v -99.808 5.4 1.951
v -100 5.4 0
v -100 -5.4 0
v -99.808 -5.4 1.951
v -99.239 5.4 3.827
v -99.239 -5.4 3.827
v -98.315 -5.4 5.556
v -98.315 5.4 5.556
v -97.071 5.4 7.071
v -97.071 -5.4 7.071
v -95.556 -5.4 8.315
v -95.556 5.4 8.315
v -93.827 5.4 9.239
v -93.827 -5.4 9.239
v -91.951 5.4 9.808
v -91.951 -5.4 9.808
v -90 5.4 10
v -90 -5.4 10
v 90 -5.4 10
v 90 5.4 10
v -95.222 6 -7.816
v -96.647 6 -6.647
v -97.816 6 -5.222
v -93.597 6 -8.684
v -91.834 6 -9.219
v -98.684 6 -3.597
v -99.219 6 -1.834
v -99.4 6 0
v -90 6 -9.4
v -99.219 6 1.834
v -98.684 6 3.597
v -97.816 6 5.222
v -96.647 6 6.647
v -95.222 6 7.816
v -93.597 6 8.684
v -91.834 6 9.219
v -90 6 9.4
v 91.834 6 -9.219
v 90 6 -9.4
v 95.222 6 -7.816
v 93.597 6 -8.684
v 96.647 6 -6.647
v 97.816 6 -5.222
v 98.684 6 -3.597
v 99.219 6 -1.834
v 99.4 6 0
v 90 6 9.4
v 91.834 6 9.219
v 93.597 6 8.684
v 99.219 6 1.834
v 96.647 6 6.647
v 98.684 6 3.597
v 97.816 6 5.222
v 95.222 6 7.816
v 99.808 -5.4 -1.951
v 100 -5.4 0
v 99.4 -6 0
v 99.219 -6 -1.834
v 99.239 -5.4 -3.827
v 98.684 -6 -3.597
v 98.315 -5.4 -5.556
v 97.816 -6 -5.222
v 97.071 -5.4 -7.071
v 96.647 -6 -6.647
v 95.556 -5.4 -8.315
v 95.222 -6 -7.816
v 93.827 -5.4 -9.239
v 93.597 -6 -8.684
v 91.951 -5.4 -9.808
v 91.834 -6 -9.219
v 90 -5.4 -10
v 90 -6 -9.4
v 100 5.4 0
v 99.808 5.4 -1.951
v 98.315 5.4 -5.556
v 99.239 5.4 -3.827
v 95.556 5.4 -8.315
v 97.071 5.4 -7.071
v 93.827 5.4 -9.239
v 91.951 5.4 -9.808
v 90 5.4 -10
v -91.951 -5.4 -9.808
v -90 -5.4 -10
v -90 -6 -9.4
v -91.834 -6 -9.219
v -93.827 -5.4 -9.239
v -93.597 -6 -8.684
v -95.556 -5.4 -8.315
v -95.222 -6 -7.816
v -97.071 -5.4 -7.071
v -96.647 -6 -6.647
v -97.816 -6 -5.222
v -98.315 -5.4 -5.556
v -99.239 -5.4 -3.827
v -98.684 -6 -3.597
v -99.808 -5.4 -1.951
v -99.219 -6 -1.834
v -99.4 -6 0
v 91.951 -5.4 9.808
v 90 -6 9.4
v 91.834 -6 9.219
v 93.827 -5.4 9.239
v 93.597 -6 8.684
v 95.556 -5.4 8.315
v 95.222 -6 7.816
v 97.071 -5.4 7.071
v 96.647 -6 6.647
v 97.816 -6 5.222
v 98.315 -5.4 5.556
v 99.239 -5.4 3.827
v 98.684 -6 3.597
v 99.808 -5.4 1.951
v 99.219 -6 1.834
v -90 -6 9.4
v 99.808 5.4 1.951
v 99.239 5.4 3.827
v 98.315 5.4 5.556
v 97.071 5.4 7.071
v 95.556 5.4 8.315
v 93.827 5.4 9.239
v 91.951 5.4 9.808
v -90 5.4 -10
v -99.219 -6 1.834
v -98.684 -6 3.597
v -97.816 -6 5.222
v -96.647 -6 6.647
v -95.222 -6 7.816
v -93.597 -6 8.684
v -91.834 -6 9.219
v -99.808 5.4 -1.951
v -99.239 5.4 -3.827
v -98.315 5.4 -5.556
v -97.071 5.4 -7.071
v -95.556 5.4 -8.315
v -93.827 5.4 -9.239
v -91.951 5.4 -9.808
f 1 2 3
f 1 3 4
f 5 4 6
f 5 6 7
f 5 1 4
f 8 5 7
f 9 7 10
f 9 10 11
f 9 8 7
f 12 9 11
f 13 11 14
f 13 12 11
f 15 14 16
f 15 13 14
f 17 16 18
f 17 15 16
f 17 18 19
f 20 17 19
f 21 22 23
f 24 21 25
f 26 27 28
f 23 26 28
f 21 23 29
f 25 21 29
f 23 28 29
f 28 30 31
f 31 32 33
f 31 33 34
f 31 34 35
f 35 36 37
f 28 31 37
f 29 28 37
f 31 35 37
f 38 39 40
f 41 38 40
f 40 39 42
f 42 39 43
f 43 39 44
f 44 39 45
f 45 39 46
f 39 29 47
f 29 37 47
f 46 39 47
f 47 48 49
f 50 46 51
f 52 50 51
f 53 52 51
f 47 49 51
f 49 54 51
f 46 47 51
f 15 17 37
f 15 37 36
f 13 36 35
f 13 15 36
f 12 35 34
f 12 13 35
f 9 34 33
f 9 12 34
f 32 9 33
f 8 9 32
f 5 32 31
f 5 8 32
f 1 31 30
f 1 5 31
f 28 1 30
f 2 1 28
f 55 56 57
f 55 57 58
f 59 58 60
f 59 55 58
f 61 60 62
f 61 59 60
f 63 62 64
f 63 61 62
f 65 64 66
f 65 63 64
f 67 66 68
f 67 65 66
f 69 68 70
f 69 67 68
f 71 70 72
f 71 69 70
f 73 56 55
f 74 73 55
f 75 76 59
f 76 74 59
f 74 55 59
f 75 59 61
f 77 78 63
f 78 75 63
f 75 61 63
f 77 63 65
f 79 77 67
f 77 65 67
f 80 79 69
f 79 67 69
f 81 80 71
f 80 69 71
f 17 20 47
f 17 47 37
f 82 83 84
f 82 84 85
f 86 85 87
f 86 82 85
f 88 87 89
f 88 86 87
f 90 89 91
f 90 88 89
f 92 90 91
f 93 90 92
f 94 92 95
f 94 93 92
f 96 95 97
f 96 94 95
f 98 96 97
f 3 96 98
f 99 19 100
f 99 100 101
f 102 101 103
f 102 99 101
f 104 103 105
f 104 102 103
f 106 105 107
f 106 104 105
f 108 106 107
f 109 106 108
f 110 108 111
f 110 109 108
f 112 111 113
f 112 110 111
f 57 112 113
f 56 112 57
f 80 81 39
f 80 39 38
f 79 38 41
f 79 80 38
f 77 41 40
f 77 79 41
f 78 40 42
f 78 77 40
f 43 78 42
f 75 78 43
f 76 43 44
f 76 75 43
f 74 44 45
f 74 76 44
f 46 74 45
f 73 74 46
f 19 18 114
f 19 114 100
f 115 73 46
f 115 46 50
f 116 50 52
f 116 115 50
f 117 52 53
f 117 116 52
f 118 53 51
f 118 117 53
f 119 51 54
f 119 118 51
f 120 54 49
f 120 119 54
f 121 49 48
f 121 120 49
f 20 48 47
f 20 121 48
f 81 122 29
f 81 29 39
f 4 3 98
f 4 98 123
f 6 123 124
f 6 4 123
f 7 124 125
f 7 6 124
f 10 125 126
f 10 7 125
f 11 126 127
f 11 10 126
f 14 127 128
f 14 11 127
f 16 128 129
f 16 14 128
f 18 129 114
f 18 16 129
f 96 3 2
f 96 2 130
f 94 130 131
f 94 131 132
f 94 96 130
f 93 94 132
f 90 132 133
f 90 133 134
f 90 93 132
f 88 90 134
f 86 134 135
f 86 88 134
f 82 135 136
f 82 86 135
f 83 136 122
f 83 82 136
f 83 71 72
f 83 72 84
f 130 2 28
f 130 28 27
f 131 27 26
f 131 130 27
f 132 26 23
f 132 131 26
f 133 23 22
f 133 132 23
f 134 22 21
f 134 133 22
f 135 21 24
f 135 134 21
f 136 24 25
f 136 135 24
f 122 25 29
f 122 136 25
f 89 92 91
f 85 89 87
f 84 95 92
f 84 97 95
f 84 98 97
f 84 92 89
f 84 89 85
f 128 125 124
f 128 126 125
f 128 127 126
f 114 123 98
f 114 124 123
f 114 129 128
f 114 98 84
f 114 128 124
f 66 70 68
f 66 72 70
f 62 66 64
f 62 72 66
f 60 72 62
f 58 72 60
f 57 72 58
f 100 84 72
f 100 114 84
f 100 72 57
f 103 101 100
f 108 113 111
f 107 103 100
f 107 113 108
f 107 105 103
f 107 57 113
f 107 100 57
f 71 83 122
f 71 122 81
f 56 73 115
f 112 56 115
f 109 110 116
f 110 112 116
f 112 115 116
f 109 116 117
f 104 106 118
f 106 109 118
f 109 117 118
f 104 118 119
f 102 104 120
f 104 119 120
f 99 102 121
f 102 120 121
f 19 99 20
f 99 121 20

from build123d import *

# Parameters (mm, degrees)
F0_W     = 200
F0_H     = 20
F1_DEPTH = 6
F2_R     = 9.99999
F3_SIZE  = 0.6


# Not quite as in the source:
# - a fillet or chamfer is up to 0.001 mm smaller than in the source, because OpenCascade refuses the exact size


with BuildPart() as f1:
    # F0 (on Front) → F1 (new body, symmetric)
    with BuildSketch(Plane.XZ):
        Rectangle(F0_W, F0_H)
    extrude(amount=F1_DEPTH, both=True)

    # F2 (radius 10 in the source; OpenCascade refuses exactly that, so slightly less here)
    f2_edges = [f1.edges().sort_by_distance(p)[0] for p in [
        (100, 0, -10),
        (100, 0, 10),
        (-100, 0, -10),
        (-100, 0, 10),
    ]]
    fillet(f2_edges, radius=F2_R)

    # F3
    f3_edges = [f1.edges().sort_by_distance(p)[0] for p in [
        (0, -6, 10),
        (100, -6, 0),
        (97.071071, -6, -7.071071),
        (97.071071, -6, 7.071071),
        (0, -6, -10),
        (-97.071071, -6, -7.071071),
        (-97.071071, -6, 7.071071),
        (-100, -6, 0),
        (100, 6, 0),
        (97.071071, 6, -7.071071),
        (97.071071, 6, 7.071071),
        (0, 6, -10),
        (0, 6, 10),
        (-97.071071, 6, -7.071071),
        (-97.071071, 6, 7.071071),
        (-100, 6, 0),
    ]]
    chamfer(f3_edges, length=F3_SIZE)


solid = f1.part
